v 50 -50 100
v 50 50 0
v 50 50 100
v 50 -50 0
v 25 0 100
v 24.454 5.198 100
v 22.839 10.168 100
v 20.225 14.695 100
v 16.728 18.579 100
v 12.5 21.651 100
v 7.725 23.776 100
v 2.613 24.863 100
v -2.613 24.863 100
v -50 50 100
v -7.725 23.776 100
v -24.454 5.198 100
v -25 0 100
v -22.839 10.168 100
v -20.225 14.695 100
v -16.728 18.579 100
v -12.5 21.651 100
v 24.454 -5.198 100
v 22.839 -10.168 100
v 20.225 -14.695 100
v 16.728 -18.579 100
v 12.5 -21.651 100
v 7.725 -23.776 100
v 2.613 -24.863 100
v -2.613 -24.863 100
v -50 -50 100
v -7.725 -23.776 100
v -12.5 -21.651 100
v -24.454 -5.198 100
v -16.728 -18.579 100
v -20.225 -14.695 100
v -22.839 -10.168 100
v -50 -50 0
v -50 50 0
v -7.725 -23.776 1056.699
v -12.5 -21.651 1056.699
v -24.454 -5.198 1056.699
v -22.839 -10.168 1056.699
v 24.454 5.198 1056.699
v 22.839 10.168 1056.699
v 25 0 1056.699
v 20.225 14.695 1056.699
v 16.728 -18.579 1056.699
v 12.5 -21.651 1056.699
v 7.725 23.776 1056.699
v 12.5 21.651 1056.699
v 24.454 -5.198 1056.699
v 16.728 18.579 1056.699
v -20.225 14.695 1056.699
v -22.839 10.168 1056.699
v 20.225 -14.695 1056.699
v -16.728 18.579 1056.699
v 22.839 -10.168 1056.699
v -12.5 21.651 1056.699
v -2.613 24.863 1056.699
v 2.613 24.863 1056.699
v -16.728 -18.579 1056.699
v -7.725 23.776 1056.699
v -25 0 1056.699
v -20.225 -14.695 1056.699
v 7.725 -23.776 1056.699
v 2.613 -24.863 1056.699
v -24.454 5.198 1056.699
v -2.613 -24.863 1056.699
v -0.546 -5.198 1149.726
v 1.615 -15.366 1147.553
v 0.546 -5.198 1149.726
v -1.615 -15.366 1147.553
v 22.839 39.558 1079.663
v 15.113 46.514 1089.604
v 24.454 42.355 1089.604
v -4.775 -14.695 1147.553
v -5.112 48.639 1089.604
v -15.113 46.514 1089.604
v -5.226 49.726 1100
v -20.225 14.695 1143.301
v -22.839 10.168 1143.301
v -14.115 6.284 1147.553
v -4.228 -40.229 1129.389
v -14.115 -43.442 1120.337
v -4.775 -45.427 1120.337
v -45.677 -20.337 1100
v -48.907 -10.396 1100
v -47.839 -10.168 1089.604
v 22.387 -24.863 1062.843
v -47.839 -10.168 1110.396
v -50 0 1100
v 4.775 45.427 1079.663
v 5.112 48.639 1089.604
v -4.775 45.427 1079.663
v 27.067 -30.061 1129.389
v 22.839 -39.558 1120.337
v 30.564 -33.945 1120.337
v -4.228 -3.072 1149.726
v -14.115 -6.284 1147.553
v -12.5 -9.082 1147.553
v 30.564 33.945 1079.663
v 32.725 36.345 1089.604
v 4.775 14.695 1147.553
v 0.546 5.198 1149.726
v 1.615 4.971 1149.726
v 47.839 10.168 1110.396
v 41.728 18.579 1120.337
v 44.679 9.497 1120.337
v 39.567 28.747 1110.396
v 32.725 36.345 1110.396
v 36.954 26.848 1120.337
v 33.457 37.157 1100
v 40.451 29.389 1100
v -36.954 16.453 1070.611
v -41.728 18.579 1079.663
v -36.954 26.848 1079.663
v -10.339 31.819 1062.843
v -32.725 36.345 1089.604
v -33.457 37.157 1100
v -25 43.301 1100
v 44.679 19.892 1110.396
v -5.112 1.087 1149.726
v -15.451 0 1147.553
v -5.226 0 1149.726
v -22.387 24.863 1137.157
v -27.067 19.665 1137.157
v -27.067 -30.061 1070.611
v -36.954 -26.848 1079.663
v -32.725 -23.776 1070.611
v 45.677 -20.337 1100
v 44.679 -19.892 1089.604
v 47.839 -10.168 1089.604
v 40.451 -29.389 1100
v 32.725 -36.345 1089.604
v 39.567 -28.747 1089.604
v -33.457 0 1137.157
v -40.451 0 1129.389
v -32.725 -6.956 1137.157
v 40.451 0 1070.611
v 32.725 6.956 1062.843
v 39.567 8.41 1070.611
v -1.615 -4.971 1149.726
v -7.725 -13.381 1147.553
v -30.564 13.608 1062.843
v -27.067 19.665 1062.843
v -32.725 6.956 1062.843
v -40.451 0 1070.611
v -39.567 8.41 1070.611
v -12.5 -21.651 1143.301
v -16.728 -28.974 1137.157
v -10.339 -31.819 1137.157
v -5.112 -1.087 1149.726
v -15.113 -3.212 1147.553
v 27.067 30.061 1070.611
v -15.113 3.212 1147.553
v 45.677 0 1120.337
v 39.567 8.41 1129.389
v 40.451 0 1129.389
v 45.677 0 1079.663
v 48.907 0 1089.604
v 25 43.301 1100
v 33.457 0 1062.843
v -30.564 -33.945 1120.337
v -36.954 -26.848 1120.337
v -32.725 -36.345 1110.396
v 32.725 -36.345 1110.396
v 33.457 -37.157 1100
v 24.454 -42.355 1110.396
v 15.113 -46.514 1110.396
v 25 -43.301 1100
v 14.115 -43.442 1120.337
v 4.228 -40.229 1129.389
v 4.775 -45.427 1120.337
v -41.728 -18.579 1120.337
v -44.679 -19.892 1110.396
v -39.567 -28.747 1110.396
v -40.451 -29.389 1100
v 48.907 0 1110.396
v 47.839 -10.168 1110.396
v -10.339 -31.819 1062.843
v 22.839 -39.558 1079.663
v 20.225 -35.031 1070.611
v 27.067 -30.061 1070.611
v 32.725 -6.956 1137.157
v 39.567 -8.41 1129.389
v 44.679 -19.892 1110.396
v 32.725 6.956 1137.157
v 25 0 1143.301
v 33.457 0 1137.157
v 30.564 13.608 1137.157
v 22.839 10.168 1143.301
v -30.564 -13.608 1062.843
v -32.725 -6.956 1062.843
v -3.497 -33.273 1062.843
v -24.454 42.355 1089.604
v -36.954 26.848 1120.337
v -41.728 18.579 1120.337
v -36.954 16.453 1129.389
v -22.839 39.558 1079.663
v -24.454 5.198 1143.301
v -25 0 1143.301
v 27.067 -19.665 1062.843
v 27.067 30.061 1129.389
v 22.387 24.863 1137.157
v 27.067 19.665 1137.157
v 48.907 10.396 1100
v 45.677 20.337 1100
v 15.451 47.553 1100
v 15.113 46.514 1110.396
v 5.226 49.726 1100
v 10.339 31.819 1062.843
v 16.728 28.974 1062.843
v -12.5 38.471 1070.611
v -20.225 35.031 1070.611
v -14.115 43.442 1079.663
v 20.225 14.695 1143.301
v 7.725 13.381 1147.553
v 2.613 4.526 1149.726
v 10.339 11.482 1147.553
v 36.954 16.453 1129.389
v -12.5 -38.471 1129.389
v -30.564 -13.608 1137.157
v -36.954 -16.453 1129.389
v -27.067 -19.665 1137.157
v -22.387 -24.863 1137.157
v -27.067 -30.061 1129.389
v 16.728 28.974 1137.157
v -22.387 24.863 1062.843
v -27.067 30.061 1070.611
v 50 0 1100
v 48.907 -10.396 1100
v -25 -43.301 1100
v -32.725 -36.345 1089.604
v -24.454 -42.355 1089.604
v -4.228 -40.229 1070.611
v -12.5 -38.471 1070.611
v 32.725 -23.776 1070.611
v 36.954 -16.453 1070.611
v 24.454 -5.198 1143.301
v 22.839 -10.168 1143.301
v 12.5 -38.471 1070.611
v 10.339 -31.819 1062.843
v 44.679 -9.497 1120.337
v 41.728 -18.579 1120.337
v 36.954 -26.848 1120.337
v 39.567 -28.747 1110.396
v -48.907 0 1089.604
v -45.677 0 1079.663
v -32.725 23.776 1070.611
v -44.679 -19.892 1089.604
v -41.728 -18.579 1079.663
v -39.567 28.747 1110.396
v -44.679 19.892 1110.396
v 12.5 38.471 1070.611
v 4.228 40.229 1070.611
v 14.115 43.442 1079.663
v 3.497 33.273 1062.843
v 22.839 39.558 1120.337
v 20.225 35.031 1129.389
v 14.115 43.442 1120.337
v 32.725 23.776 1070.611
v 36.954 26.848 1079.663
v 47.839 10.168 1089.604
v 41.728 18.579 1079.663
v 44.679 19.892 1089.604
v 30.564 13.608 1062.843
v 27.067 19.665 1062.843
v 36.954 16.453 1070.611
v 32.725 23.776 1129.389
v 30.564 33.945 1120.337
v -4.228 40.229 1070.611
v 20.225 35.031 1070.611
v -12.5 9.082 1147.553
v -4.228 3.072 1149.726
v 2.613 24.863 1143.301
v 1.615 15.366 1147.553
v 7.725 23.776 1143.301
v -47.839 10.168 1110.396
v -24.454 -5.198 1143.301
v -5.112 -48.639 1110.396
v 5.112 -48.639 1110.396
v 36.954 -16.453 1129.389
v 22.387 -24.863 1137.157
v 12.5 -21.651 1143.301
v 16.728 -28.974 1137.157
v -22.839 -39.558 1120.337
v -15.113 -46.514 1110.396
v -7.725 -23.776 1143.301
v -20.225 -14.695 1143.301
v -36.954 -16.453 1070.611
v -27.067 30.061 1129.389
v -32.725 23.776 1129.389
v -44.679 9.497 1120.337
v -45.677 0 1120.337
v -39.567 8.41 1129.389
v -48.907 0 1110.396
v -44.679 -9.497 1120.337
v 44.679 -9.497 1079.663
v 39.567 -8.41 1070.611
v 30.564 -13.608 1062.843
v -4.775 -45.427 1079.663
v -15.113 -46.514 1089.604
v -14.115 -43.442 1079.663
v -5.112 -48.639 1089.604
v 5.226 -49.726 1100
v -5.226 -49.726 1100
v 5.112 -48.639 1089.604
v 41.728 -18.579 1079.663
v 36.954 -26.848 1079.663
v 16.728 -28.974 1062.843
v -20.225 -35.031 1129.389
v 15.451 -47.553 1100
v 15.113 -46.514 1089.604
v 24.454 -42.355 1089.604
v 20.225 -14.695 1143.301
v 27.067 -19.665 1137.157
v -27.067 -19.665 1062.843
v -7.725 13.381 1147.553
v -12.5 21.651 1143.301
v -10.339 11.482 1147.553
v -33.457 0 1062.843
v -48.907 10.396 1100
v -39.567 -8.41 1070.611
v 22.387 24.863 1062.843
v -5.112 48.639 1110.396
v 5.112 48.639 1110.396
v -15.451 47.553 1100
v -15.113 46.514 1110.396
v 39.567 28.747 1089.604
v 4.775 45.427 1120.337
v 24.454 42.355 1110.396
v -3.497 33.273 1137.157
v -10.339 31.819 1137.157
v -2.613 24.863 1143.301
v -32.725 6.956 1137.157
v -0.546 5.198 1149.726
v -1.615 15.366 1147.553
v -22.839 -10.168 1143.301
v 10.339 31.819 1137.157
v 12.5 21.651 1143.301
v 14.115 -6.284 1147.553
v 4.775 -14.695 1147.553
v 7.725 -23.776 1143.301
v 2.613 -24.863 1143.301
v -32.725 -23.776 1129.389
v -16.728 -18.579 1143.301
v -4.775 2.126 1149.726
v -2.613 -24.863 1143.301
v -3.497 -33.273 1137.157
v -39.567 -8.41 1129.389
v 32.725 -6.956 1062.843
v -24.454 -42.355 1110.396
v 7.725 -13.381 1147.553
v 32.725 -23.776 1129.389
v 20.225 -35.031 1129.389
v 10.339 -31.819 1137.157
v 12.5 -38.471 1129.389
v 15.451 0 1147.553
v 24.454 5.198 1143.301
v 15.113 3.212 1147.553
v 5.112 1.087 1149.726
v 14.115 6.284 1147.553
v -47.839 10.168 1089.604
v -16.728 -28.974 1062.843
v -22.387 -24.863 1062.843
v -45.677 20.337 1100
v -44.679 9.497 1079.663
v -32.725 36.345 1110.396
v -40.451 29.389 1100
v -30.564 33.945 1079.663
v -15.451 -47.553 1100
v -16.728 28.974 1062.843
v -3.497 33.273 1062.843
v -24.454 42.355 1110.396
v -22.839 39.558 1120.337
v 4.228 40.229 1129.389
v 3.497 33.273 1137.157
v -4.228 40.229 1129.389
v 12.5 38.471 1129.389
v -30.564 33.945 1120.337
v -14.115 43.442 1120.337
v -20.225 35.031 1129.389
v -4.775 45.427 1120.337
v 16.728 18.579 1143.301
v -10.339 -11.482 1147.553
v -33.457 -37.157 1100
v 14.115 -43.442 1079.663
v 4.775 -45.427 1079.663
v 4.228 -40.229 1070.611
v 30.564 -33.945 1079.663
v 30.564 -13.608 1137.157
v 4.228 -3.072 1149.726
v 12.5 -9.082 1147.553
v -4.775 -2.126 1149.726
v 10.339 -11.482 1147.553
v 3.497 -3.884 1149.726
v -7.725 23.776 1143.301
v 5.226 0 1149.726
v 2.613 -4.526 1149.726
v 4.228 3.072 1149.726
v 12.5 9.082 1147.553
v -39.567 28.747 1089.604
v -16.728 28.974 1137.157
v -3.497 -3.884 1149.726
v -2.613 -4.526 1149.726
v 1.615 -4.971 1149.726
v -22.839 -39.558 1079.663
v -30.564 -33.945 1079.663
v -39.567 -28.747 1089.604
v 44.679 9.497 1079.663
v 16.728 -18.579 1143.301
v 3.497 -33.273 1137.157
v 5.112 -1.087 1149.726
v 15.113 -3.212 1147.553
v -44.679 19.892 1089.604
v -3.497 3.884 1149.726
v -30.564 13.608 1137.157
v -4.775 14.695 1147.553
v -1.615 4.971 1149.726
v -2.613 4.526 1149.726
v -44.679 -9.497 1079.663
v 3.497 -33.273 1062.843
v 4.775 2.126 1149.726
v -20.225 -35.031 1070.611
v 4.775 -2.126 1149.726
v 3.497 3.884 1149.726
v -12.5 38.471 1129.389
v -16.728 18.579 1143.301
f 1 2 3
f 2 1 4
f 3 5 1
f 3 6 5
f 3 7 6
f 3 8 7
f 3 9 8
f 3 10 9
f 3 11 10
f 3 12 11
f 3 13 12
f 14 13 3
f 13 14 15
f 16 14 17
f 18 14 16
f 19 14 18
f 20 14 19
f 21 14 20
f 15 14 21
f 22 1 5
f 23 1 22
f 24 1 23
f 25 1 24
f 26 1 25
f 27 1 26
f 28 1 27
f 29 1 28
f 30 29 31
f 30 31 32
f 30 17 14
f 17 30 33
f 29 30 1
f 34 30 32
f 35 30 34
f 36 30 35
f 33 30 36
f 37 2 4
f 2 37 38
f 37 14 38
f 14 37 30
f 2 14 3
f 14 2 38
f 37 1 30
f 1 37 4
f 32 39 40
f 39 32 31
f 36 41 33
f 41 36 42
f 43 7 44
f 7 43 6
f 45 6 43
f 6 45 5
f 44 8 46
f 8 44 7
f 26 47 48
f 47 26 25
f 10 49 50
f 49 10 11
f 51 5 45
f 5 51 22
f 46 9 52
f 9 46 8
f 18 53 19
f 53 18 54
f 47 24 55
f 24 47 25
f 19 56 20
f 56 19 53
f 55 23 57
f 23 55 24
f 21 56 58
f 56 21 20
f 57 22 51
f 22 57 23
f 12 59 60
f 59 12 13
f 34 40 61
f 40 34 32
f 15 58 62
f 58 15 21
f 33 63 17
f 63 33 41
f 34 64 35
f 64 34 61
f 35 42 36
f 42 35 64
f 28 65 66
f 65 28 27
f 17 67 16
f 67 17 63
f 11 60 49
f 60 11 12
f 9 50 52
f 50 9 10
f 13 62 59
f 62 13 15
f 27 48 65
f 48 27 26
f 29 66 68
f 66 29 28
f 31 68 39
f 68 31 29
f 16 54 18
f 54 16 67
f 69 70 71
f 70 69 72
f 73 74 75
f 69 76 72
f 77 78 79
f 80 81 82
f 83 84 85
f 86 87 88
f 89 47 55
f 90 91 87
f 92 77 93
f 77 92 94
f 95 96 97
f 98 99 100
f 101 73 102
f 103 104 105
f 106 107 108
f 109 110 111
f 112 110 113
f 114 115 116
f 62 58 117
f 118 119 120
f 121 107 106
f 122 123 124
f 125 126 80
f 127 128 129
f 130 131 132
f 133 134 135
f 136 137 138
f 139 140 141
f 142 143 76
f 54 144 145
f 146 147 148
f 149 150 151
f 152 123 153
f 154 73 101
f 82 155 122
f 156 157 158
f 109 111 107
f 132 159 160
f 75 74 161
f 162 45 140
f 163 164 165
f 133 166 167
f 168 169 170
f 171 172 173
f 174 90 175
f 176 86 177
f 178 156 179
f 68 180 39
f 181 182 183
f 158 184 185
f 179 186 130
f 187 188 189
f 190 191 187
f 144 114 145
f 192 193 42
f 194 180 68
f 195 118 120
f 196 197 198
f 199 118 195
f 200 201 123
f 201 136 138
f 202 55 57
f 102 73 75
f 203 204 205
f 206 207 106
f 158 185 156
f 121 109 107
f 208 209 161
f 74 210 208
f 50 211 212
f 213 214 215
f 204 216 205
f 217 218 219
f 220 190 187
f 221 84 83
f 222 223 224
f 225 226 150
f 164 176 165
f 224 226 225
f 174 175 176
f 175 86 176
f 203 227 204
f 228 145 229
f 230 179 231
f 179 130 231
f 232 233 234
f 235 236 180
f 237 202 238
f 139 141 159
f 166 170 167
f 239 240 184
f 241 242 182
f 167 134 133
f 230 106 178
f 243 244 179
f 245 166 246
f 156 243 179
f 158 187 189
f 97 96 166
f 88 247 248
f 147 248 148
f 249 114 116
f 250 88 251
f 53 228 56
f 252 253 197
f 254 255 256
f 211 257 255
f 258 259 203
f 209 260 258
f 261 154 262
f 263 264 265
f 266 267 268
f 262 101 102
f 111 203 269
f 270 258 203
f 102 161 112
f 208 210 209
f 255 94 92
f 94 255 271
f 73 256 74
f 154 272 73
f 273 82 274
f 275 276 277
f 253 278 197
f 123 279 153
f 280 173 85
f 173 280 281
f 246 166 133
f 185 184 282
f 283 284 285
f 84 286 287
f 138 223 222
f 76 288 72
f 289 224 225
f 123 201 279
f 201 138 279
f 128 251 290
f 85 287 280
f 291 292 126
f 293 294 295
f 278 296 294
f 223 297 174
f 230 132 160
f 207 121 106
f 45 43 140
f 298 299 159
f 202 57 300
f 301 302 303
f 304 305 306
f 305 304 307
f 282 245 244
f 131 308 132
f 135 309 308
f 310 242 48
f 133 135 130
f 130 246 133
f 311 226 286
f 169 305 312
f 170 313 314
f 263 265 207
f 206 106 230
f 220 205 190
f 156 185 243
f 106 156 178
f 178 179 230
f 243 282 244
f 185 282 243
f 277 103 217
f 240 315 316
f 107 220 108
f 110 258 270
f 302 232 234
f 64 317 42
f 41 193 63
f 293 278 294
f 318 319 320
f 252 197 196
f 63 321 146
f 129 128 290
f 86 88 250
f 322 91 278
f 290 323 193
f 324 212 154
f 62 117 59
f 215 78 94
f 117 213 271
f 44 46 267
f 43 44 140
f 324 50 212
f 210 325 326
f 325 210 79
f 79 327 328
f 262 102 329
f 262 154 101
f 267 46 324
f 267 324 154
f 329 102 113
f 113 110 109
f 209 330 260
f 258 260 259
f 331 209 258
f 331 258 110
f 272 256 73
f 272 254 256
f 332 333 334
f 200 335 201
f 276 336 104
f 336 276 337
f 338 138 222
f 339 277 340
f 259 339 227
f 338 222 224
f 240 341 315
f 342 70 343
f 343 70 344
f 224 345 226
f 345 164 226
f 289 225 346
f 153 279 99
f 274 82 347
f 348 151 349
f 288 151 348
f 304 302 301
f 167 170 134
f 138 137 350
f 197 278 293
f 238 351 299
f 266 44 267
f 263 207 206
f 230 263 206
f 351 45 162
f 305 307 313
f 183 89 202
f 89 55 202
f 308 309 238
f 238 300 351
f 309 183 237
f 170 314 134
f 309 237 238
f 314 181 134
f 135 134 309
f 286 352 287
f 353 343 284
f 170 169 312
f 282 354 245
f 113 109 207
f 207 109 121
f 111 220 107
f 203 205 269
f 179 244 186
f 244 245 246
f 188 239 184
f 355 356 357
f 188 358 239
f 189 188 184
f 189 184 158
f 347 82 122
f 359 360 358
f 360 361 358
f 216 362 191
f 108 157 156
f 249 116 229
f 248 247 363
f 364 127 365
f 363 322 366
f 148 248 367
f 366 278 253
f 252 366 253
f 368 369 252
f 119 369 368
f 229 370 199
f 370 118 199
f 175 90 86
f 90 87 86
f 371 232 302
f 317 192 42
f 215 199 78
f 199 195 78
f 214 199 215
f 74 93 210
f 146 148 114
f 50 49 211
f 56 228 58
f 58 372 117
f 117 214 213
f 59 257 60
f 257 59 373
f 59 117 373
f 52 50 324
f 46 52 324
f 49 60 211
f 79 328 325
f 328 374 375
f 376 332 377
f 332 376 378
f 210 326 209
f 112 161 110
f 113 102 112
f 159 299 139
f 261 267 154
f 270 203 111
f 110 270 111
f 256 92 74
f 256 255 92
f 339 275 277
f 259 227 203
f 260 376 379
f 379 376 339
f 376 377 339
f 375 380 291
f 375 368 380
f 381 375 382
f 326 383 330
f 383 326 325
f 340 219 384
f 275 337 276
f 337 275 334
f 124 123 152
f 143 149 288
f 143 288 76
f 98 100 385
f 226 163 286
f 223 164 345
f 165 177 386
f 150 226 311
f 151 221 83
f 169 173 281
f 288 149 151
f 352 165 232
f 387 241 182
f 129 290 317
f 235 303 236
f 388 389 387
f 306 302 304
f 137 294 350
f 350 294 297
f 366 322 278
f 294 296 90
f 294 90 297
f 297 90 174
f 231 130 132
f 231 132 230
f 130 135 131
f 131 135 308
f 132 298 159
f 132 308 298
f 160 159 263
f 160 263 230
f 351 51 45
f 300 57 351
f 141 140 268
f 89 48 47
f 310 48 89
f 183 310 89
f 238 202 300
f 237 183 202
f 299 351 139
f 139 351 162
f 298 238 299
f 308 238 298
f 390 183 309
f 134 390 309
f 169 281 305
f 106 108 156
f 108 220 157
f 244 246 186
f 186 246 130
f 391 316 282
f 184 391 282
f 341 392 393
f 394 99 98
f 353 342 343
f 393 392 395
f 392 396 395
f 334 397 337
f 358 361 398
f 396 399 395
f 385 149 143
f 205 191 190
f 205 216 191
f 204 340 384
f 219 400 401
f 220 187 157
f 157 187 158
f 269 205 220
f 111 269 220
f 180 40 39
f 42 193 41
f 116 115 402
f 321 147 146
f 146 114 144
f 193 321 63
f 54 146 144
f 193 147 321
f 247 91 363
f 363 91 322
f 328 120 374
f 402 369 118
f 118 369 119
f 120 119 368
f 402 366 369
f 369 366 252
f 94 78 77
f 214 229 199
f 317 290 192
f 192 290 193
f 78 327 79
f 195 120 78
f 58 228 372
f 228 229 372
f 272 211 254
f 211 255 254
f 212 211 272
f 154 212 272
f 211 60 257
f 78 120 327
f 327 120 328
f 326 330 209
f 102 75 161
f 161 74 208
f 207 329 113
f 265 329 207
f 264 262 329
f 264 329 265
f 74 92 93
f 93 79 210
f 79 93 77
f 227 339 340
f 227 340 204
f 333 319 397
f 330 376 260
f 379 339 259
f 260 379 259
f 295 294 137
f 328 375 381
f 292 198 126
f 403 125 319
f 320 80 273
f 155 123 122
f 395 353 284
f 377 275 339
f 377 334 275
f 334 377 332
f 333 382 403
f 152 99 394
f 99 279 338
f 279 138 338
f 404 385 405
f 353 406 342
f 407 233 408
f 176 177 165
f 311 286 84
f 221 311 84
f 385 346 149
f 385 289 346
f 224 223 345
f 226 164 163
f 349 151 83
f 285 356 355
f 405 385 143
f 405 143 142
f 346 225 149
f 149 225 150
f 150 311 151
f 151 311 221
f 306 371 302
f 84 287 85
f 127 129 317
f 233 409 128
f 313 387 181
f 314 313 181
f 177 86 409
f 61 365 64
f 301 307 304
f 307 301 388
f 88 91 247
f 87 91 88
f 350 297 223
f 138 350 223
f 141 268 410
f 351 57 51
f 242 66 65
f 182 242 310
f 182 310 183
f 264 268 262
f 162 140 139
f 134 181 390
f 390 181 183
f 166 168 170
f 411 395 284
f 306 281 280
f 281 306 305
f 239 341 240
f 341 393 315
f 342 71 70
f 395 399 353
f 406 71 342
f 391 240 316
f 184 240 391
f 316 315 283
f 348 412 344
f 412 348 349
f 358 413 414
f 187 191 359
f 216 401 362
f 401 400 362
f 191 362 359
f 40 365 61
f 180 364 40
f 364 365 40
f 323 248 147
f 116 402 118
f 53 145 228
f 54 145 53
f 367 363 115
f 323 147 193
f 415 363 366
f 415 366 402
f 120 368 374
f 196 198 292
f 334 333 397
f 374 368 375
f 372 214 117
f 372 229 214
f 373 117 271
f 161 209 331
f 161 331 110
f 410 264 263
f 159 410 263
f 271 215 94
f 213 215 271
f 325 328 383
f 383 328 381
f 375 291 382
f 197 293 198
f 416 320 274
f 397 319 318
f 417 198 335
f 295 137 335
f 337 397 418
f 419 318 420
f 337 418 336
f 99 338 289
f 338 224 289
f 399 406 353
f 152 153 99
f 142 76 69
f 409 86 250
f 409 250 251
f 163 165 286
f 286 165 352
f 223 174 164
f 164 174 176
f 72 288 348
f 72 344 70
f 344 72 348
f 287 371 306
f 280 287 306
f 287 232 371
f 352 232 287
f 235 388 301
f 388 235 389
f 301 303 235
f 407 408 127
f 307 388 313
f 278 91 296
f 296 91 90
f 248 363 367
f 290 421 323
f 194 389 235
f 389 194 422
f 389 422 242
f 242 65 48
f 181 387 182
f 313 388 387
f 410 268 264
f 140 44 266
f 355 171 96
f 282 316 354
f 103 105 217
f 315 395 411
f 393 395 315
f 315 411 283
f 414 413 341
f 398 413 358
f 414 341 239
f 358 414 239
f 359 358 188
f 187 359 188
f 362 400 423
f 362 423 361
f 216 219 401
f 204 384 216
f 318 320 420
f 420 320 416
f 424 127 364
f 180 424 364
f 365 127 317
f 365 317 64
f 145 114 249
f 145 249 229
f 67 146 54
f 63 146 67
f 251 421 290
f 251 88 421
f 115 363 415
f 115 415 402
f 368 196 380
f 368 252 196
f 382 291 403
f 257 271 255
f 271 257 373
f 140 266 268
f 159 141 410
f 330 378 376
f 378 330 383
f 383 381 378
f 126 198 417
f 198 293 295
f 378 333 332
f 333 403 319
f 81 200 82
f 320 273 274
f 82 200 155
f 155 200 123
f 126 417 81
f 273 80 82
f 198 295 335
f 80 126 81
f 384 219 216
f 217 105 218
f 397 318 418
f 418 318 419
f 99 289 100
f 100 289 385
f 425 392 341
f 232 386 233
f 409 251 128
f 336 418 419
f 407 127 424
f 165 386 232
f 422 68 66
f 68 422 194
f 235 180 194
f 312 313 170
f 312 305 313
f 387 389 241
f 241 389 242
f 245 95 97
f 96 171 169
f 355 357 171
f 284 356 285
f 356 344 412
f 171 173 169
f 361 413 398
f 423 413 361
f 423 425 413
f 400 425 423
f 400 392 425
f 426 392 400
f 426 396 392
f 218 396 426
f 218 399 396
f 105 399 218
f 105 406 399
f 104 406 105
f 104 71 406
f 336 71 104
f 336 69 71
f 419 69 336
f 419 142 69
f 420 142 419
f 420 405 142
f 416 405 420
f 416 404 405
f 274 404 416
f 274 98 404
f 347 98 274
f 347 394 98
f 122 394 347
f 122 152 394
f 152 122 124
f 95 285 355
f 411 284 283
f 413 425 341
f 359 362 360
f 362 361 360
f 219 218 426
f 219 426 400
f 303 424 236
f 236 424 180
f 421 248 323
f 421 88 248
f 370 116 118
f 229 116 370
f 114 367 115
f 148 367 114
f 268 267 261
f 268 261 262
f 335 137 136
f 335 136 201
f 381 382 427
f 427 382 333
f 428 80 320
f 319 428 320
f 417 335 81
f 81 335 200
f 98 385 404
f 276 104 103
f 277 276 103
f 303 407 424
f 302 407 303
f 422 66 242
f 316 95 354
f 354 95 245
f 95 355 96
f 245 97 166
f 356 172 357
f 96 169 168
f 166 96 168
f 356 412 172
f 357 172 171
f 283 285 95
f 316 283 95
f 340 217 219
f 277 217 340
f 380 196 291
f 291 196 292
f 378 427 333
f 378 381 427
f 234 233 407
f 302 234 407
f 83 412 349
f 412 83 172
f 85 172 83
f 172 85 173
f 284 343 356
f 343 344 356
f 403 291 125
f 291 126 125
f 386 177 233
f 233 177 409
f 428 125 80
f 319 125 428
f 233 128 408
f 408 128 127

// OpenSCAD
// Units in millimeters (1 cm = 10 mm)
sphere_r = 50;     // 5 cm radius
cyl_dia  = 50;     // 5 cm diameter
cyl_h    = 1000;   // 100 cm height
cube_side = 100;   // 10 cm cube

union() {
    // Cube base (centered at origin bottom)
    translate([-cube_side/2, -cube_side/2, 0])
        cube([cube_side, cube_side, cube_side]);

    // Cylinder standing on top of cube
    translate([0, 0, cube_side])
        cylinder(d = cyl_dia, h = cyl_h);

    // Sphere sitting on top of cylinder
    translate([0, 0, cube_side + cyl_h])
        sphere(r = sphere_r);
}
